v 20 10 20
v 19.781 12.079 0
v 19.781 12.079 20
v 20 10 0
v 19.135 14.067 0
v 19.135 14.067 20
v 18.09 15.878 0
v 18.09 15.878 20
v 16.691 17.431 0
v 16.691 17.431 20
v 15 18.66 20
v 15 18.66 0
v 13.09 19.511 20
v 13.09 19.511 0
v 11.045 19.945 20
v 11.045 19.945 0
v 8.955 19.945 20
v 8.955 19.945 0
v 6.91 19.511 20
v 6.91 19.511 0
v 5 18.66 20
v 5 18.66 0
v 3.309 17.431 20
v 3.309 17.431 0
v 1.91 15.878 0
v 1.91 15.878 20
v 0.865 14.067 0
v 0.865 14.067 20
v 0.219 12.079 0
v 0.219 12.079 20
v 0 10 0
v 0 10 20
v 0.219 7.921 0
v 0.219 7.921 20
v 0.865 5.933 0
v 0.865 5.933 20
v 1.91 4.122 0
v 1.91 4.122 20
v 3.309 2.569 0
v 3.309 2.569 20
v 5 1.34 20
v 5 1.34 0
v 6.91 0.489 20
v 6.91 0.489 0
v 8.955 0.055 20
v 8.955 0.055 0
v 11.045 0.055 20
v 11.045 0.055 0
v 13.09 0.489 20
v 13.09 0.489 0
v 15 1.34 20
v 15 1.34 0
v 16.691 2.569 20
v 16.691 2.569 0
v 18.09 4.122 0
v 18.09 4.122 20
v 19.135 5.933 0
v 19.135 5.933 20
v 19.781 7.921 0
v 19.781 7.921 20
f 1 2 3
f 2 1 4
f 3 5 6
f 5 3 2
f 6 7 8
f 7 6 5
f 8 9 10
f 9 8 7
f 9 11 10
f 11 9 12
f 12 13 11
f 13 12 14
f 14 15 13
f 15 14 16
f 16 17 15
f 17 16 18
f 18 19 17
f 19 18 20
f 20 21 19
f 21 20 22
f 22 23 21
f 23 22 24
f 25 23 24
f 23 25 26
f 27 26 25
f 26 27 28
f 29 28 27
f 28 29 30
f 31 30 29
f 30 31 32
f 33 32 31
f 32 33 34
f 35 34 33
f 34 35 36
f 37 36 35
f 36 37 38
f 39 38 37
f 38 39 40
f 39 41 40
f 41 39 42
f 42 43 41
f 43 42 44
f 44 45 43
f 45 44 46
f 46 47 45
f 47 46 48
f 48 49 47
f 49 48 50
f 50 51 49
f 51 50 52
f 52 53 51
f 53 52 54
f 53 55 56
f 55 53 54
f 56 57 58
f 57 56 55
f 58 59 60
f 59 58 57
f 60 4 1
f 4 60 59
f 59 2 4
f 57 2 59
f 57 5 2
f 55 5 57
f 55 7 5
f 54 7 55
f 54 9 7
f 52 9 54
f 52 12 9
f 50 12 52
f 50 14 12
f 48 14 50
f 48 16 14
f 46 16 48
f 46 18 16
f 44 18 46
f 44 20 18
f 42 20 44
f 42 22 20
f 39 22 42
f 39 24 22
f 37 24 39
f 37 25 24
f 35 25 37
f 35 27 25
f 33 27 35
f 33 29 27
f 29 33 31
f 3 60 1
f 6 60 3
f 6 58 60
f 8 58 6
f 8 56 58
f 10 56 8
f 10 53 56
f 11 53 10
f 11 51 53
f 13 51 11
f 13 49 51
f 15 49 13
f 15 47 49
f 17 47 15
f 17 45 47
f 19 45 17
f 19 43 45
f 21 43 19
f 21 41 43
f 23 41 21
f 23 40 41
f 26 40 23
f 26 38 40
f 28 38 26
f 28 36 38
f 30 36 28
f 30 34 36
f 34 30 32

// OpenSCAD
top_radius = 10;
bottom_radius = 10;
height = 20;

if (top_radius > bottom_radius){
	translate([top_radius, top_radius, 0]){
		cylinder(height, bottom_radius, top_radius, center=false);
	}
}
else
{
	movement = [bottom_radius, bottom_radius, 0];
	translate([bottom_radius, bottom_radius, 0]){
		cylinder(height, bottom_radius, top_radius, center=false);
	}
}
